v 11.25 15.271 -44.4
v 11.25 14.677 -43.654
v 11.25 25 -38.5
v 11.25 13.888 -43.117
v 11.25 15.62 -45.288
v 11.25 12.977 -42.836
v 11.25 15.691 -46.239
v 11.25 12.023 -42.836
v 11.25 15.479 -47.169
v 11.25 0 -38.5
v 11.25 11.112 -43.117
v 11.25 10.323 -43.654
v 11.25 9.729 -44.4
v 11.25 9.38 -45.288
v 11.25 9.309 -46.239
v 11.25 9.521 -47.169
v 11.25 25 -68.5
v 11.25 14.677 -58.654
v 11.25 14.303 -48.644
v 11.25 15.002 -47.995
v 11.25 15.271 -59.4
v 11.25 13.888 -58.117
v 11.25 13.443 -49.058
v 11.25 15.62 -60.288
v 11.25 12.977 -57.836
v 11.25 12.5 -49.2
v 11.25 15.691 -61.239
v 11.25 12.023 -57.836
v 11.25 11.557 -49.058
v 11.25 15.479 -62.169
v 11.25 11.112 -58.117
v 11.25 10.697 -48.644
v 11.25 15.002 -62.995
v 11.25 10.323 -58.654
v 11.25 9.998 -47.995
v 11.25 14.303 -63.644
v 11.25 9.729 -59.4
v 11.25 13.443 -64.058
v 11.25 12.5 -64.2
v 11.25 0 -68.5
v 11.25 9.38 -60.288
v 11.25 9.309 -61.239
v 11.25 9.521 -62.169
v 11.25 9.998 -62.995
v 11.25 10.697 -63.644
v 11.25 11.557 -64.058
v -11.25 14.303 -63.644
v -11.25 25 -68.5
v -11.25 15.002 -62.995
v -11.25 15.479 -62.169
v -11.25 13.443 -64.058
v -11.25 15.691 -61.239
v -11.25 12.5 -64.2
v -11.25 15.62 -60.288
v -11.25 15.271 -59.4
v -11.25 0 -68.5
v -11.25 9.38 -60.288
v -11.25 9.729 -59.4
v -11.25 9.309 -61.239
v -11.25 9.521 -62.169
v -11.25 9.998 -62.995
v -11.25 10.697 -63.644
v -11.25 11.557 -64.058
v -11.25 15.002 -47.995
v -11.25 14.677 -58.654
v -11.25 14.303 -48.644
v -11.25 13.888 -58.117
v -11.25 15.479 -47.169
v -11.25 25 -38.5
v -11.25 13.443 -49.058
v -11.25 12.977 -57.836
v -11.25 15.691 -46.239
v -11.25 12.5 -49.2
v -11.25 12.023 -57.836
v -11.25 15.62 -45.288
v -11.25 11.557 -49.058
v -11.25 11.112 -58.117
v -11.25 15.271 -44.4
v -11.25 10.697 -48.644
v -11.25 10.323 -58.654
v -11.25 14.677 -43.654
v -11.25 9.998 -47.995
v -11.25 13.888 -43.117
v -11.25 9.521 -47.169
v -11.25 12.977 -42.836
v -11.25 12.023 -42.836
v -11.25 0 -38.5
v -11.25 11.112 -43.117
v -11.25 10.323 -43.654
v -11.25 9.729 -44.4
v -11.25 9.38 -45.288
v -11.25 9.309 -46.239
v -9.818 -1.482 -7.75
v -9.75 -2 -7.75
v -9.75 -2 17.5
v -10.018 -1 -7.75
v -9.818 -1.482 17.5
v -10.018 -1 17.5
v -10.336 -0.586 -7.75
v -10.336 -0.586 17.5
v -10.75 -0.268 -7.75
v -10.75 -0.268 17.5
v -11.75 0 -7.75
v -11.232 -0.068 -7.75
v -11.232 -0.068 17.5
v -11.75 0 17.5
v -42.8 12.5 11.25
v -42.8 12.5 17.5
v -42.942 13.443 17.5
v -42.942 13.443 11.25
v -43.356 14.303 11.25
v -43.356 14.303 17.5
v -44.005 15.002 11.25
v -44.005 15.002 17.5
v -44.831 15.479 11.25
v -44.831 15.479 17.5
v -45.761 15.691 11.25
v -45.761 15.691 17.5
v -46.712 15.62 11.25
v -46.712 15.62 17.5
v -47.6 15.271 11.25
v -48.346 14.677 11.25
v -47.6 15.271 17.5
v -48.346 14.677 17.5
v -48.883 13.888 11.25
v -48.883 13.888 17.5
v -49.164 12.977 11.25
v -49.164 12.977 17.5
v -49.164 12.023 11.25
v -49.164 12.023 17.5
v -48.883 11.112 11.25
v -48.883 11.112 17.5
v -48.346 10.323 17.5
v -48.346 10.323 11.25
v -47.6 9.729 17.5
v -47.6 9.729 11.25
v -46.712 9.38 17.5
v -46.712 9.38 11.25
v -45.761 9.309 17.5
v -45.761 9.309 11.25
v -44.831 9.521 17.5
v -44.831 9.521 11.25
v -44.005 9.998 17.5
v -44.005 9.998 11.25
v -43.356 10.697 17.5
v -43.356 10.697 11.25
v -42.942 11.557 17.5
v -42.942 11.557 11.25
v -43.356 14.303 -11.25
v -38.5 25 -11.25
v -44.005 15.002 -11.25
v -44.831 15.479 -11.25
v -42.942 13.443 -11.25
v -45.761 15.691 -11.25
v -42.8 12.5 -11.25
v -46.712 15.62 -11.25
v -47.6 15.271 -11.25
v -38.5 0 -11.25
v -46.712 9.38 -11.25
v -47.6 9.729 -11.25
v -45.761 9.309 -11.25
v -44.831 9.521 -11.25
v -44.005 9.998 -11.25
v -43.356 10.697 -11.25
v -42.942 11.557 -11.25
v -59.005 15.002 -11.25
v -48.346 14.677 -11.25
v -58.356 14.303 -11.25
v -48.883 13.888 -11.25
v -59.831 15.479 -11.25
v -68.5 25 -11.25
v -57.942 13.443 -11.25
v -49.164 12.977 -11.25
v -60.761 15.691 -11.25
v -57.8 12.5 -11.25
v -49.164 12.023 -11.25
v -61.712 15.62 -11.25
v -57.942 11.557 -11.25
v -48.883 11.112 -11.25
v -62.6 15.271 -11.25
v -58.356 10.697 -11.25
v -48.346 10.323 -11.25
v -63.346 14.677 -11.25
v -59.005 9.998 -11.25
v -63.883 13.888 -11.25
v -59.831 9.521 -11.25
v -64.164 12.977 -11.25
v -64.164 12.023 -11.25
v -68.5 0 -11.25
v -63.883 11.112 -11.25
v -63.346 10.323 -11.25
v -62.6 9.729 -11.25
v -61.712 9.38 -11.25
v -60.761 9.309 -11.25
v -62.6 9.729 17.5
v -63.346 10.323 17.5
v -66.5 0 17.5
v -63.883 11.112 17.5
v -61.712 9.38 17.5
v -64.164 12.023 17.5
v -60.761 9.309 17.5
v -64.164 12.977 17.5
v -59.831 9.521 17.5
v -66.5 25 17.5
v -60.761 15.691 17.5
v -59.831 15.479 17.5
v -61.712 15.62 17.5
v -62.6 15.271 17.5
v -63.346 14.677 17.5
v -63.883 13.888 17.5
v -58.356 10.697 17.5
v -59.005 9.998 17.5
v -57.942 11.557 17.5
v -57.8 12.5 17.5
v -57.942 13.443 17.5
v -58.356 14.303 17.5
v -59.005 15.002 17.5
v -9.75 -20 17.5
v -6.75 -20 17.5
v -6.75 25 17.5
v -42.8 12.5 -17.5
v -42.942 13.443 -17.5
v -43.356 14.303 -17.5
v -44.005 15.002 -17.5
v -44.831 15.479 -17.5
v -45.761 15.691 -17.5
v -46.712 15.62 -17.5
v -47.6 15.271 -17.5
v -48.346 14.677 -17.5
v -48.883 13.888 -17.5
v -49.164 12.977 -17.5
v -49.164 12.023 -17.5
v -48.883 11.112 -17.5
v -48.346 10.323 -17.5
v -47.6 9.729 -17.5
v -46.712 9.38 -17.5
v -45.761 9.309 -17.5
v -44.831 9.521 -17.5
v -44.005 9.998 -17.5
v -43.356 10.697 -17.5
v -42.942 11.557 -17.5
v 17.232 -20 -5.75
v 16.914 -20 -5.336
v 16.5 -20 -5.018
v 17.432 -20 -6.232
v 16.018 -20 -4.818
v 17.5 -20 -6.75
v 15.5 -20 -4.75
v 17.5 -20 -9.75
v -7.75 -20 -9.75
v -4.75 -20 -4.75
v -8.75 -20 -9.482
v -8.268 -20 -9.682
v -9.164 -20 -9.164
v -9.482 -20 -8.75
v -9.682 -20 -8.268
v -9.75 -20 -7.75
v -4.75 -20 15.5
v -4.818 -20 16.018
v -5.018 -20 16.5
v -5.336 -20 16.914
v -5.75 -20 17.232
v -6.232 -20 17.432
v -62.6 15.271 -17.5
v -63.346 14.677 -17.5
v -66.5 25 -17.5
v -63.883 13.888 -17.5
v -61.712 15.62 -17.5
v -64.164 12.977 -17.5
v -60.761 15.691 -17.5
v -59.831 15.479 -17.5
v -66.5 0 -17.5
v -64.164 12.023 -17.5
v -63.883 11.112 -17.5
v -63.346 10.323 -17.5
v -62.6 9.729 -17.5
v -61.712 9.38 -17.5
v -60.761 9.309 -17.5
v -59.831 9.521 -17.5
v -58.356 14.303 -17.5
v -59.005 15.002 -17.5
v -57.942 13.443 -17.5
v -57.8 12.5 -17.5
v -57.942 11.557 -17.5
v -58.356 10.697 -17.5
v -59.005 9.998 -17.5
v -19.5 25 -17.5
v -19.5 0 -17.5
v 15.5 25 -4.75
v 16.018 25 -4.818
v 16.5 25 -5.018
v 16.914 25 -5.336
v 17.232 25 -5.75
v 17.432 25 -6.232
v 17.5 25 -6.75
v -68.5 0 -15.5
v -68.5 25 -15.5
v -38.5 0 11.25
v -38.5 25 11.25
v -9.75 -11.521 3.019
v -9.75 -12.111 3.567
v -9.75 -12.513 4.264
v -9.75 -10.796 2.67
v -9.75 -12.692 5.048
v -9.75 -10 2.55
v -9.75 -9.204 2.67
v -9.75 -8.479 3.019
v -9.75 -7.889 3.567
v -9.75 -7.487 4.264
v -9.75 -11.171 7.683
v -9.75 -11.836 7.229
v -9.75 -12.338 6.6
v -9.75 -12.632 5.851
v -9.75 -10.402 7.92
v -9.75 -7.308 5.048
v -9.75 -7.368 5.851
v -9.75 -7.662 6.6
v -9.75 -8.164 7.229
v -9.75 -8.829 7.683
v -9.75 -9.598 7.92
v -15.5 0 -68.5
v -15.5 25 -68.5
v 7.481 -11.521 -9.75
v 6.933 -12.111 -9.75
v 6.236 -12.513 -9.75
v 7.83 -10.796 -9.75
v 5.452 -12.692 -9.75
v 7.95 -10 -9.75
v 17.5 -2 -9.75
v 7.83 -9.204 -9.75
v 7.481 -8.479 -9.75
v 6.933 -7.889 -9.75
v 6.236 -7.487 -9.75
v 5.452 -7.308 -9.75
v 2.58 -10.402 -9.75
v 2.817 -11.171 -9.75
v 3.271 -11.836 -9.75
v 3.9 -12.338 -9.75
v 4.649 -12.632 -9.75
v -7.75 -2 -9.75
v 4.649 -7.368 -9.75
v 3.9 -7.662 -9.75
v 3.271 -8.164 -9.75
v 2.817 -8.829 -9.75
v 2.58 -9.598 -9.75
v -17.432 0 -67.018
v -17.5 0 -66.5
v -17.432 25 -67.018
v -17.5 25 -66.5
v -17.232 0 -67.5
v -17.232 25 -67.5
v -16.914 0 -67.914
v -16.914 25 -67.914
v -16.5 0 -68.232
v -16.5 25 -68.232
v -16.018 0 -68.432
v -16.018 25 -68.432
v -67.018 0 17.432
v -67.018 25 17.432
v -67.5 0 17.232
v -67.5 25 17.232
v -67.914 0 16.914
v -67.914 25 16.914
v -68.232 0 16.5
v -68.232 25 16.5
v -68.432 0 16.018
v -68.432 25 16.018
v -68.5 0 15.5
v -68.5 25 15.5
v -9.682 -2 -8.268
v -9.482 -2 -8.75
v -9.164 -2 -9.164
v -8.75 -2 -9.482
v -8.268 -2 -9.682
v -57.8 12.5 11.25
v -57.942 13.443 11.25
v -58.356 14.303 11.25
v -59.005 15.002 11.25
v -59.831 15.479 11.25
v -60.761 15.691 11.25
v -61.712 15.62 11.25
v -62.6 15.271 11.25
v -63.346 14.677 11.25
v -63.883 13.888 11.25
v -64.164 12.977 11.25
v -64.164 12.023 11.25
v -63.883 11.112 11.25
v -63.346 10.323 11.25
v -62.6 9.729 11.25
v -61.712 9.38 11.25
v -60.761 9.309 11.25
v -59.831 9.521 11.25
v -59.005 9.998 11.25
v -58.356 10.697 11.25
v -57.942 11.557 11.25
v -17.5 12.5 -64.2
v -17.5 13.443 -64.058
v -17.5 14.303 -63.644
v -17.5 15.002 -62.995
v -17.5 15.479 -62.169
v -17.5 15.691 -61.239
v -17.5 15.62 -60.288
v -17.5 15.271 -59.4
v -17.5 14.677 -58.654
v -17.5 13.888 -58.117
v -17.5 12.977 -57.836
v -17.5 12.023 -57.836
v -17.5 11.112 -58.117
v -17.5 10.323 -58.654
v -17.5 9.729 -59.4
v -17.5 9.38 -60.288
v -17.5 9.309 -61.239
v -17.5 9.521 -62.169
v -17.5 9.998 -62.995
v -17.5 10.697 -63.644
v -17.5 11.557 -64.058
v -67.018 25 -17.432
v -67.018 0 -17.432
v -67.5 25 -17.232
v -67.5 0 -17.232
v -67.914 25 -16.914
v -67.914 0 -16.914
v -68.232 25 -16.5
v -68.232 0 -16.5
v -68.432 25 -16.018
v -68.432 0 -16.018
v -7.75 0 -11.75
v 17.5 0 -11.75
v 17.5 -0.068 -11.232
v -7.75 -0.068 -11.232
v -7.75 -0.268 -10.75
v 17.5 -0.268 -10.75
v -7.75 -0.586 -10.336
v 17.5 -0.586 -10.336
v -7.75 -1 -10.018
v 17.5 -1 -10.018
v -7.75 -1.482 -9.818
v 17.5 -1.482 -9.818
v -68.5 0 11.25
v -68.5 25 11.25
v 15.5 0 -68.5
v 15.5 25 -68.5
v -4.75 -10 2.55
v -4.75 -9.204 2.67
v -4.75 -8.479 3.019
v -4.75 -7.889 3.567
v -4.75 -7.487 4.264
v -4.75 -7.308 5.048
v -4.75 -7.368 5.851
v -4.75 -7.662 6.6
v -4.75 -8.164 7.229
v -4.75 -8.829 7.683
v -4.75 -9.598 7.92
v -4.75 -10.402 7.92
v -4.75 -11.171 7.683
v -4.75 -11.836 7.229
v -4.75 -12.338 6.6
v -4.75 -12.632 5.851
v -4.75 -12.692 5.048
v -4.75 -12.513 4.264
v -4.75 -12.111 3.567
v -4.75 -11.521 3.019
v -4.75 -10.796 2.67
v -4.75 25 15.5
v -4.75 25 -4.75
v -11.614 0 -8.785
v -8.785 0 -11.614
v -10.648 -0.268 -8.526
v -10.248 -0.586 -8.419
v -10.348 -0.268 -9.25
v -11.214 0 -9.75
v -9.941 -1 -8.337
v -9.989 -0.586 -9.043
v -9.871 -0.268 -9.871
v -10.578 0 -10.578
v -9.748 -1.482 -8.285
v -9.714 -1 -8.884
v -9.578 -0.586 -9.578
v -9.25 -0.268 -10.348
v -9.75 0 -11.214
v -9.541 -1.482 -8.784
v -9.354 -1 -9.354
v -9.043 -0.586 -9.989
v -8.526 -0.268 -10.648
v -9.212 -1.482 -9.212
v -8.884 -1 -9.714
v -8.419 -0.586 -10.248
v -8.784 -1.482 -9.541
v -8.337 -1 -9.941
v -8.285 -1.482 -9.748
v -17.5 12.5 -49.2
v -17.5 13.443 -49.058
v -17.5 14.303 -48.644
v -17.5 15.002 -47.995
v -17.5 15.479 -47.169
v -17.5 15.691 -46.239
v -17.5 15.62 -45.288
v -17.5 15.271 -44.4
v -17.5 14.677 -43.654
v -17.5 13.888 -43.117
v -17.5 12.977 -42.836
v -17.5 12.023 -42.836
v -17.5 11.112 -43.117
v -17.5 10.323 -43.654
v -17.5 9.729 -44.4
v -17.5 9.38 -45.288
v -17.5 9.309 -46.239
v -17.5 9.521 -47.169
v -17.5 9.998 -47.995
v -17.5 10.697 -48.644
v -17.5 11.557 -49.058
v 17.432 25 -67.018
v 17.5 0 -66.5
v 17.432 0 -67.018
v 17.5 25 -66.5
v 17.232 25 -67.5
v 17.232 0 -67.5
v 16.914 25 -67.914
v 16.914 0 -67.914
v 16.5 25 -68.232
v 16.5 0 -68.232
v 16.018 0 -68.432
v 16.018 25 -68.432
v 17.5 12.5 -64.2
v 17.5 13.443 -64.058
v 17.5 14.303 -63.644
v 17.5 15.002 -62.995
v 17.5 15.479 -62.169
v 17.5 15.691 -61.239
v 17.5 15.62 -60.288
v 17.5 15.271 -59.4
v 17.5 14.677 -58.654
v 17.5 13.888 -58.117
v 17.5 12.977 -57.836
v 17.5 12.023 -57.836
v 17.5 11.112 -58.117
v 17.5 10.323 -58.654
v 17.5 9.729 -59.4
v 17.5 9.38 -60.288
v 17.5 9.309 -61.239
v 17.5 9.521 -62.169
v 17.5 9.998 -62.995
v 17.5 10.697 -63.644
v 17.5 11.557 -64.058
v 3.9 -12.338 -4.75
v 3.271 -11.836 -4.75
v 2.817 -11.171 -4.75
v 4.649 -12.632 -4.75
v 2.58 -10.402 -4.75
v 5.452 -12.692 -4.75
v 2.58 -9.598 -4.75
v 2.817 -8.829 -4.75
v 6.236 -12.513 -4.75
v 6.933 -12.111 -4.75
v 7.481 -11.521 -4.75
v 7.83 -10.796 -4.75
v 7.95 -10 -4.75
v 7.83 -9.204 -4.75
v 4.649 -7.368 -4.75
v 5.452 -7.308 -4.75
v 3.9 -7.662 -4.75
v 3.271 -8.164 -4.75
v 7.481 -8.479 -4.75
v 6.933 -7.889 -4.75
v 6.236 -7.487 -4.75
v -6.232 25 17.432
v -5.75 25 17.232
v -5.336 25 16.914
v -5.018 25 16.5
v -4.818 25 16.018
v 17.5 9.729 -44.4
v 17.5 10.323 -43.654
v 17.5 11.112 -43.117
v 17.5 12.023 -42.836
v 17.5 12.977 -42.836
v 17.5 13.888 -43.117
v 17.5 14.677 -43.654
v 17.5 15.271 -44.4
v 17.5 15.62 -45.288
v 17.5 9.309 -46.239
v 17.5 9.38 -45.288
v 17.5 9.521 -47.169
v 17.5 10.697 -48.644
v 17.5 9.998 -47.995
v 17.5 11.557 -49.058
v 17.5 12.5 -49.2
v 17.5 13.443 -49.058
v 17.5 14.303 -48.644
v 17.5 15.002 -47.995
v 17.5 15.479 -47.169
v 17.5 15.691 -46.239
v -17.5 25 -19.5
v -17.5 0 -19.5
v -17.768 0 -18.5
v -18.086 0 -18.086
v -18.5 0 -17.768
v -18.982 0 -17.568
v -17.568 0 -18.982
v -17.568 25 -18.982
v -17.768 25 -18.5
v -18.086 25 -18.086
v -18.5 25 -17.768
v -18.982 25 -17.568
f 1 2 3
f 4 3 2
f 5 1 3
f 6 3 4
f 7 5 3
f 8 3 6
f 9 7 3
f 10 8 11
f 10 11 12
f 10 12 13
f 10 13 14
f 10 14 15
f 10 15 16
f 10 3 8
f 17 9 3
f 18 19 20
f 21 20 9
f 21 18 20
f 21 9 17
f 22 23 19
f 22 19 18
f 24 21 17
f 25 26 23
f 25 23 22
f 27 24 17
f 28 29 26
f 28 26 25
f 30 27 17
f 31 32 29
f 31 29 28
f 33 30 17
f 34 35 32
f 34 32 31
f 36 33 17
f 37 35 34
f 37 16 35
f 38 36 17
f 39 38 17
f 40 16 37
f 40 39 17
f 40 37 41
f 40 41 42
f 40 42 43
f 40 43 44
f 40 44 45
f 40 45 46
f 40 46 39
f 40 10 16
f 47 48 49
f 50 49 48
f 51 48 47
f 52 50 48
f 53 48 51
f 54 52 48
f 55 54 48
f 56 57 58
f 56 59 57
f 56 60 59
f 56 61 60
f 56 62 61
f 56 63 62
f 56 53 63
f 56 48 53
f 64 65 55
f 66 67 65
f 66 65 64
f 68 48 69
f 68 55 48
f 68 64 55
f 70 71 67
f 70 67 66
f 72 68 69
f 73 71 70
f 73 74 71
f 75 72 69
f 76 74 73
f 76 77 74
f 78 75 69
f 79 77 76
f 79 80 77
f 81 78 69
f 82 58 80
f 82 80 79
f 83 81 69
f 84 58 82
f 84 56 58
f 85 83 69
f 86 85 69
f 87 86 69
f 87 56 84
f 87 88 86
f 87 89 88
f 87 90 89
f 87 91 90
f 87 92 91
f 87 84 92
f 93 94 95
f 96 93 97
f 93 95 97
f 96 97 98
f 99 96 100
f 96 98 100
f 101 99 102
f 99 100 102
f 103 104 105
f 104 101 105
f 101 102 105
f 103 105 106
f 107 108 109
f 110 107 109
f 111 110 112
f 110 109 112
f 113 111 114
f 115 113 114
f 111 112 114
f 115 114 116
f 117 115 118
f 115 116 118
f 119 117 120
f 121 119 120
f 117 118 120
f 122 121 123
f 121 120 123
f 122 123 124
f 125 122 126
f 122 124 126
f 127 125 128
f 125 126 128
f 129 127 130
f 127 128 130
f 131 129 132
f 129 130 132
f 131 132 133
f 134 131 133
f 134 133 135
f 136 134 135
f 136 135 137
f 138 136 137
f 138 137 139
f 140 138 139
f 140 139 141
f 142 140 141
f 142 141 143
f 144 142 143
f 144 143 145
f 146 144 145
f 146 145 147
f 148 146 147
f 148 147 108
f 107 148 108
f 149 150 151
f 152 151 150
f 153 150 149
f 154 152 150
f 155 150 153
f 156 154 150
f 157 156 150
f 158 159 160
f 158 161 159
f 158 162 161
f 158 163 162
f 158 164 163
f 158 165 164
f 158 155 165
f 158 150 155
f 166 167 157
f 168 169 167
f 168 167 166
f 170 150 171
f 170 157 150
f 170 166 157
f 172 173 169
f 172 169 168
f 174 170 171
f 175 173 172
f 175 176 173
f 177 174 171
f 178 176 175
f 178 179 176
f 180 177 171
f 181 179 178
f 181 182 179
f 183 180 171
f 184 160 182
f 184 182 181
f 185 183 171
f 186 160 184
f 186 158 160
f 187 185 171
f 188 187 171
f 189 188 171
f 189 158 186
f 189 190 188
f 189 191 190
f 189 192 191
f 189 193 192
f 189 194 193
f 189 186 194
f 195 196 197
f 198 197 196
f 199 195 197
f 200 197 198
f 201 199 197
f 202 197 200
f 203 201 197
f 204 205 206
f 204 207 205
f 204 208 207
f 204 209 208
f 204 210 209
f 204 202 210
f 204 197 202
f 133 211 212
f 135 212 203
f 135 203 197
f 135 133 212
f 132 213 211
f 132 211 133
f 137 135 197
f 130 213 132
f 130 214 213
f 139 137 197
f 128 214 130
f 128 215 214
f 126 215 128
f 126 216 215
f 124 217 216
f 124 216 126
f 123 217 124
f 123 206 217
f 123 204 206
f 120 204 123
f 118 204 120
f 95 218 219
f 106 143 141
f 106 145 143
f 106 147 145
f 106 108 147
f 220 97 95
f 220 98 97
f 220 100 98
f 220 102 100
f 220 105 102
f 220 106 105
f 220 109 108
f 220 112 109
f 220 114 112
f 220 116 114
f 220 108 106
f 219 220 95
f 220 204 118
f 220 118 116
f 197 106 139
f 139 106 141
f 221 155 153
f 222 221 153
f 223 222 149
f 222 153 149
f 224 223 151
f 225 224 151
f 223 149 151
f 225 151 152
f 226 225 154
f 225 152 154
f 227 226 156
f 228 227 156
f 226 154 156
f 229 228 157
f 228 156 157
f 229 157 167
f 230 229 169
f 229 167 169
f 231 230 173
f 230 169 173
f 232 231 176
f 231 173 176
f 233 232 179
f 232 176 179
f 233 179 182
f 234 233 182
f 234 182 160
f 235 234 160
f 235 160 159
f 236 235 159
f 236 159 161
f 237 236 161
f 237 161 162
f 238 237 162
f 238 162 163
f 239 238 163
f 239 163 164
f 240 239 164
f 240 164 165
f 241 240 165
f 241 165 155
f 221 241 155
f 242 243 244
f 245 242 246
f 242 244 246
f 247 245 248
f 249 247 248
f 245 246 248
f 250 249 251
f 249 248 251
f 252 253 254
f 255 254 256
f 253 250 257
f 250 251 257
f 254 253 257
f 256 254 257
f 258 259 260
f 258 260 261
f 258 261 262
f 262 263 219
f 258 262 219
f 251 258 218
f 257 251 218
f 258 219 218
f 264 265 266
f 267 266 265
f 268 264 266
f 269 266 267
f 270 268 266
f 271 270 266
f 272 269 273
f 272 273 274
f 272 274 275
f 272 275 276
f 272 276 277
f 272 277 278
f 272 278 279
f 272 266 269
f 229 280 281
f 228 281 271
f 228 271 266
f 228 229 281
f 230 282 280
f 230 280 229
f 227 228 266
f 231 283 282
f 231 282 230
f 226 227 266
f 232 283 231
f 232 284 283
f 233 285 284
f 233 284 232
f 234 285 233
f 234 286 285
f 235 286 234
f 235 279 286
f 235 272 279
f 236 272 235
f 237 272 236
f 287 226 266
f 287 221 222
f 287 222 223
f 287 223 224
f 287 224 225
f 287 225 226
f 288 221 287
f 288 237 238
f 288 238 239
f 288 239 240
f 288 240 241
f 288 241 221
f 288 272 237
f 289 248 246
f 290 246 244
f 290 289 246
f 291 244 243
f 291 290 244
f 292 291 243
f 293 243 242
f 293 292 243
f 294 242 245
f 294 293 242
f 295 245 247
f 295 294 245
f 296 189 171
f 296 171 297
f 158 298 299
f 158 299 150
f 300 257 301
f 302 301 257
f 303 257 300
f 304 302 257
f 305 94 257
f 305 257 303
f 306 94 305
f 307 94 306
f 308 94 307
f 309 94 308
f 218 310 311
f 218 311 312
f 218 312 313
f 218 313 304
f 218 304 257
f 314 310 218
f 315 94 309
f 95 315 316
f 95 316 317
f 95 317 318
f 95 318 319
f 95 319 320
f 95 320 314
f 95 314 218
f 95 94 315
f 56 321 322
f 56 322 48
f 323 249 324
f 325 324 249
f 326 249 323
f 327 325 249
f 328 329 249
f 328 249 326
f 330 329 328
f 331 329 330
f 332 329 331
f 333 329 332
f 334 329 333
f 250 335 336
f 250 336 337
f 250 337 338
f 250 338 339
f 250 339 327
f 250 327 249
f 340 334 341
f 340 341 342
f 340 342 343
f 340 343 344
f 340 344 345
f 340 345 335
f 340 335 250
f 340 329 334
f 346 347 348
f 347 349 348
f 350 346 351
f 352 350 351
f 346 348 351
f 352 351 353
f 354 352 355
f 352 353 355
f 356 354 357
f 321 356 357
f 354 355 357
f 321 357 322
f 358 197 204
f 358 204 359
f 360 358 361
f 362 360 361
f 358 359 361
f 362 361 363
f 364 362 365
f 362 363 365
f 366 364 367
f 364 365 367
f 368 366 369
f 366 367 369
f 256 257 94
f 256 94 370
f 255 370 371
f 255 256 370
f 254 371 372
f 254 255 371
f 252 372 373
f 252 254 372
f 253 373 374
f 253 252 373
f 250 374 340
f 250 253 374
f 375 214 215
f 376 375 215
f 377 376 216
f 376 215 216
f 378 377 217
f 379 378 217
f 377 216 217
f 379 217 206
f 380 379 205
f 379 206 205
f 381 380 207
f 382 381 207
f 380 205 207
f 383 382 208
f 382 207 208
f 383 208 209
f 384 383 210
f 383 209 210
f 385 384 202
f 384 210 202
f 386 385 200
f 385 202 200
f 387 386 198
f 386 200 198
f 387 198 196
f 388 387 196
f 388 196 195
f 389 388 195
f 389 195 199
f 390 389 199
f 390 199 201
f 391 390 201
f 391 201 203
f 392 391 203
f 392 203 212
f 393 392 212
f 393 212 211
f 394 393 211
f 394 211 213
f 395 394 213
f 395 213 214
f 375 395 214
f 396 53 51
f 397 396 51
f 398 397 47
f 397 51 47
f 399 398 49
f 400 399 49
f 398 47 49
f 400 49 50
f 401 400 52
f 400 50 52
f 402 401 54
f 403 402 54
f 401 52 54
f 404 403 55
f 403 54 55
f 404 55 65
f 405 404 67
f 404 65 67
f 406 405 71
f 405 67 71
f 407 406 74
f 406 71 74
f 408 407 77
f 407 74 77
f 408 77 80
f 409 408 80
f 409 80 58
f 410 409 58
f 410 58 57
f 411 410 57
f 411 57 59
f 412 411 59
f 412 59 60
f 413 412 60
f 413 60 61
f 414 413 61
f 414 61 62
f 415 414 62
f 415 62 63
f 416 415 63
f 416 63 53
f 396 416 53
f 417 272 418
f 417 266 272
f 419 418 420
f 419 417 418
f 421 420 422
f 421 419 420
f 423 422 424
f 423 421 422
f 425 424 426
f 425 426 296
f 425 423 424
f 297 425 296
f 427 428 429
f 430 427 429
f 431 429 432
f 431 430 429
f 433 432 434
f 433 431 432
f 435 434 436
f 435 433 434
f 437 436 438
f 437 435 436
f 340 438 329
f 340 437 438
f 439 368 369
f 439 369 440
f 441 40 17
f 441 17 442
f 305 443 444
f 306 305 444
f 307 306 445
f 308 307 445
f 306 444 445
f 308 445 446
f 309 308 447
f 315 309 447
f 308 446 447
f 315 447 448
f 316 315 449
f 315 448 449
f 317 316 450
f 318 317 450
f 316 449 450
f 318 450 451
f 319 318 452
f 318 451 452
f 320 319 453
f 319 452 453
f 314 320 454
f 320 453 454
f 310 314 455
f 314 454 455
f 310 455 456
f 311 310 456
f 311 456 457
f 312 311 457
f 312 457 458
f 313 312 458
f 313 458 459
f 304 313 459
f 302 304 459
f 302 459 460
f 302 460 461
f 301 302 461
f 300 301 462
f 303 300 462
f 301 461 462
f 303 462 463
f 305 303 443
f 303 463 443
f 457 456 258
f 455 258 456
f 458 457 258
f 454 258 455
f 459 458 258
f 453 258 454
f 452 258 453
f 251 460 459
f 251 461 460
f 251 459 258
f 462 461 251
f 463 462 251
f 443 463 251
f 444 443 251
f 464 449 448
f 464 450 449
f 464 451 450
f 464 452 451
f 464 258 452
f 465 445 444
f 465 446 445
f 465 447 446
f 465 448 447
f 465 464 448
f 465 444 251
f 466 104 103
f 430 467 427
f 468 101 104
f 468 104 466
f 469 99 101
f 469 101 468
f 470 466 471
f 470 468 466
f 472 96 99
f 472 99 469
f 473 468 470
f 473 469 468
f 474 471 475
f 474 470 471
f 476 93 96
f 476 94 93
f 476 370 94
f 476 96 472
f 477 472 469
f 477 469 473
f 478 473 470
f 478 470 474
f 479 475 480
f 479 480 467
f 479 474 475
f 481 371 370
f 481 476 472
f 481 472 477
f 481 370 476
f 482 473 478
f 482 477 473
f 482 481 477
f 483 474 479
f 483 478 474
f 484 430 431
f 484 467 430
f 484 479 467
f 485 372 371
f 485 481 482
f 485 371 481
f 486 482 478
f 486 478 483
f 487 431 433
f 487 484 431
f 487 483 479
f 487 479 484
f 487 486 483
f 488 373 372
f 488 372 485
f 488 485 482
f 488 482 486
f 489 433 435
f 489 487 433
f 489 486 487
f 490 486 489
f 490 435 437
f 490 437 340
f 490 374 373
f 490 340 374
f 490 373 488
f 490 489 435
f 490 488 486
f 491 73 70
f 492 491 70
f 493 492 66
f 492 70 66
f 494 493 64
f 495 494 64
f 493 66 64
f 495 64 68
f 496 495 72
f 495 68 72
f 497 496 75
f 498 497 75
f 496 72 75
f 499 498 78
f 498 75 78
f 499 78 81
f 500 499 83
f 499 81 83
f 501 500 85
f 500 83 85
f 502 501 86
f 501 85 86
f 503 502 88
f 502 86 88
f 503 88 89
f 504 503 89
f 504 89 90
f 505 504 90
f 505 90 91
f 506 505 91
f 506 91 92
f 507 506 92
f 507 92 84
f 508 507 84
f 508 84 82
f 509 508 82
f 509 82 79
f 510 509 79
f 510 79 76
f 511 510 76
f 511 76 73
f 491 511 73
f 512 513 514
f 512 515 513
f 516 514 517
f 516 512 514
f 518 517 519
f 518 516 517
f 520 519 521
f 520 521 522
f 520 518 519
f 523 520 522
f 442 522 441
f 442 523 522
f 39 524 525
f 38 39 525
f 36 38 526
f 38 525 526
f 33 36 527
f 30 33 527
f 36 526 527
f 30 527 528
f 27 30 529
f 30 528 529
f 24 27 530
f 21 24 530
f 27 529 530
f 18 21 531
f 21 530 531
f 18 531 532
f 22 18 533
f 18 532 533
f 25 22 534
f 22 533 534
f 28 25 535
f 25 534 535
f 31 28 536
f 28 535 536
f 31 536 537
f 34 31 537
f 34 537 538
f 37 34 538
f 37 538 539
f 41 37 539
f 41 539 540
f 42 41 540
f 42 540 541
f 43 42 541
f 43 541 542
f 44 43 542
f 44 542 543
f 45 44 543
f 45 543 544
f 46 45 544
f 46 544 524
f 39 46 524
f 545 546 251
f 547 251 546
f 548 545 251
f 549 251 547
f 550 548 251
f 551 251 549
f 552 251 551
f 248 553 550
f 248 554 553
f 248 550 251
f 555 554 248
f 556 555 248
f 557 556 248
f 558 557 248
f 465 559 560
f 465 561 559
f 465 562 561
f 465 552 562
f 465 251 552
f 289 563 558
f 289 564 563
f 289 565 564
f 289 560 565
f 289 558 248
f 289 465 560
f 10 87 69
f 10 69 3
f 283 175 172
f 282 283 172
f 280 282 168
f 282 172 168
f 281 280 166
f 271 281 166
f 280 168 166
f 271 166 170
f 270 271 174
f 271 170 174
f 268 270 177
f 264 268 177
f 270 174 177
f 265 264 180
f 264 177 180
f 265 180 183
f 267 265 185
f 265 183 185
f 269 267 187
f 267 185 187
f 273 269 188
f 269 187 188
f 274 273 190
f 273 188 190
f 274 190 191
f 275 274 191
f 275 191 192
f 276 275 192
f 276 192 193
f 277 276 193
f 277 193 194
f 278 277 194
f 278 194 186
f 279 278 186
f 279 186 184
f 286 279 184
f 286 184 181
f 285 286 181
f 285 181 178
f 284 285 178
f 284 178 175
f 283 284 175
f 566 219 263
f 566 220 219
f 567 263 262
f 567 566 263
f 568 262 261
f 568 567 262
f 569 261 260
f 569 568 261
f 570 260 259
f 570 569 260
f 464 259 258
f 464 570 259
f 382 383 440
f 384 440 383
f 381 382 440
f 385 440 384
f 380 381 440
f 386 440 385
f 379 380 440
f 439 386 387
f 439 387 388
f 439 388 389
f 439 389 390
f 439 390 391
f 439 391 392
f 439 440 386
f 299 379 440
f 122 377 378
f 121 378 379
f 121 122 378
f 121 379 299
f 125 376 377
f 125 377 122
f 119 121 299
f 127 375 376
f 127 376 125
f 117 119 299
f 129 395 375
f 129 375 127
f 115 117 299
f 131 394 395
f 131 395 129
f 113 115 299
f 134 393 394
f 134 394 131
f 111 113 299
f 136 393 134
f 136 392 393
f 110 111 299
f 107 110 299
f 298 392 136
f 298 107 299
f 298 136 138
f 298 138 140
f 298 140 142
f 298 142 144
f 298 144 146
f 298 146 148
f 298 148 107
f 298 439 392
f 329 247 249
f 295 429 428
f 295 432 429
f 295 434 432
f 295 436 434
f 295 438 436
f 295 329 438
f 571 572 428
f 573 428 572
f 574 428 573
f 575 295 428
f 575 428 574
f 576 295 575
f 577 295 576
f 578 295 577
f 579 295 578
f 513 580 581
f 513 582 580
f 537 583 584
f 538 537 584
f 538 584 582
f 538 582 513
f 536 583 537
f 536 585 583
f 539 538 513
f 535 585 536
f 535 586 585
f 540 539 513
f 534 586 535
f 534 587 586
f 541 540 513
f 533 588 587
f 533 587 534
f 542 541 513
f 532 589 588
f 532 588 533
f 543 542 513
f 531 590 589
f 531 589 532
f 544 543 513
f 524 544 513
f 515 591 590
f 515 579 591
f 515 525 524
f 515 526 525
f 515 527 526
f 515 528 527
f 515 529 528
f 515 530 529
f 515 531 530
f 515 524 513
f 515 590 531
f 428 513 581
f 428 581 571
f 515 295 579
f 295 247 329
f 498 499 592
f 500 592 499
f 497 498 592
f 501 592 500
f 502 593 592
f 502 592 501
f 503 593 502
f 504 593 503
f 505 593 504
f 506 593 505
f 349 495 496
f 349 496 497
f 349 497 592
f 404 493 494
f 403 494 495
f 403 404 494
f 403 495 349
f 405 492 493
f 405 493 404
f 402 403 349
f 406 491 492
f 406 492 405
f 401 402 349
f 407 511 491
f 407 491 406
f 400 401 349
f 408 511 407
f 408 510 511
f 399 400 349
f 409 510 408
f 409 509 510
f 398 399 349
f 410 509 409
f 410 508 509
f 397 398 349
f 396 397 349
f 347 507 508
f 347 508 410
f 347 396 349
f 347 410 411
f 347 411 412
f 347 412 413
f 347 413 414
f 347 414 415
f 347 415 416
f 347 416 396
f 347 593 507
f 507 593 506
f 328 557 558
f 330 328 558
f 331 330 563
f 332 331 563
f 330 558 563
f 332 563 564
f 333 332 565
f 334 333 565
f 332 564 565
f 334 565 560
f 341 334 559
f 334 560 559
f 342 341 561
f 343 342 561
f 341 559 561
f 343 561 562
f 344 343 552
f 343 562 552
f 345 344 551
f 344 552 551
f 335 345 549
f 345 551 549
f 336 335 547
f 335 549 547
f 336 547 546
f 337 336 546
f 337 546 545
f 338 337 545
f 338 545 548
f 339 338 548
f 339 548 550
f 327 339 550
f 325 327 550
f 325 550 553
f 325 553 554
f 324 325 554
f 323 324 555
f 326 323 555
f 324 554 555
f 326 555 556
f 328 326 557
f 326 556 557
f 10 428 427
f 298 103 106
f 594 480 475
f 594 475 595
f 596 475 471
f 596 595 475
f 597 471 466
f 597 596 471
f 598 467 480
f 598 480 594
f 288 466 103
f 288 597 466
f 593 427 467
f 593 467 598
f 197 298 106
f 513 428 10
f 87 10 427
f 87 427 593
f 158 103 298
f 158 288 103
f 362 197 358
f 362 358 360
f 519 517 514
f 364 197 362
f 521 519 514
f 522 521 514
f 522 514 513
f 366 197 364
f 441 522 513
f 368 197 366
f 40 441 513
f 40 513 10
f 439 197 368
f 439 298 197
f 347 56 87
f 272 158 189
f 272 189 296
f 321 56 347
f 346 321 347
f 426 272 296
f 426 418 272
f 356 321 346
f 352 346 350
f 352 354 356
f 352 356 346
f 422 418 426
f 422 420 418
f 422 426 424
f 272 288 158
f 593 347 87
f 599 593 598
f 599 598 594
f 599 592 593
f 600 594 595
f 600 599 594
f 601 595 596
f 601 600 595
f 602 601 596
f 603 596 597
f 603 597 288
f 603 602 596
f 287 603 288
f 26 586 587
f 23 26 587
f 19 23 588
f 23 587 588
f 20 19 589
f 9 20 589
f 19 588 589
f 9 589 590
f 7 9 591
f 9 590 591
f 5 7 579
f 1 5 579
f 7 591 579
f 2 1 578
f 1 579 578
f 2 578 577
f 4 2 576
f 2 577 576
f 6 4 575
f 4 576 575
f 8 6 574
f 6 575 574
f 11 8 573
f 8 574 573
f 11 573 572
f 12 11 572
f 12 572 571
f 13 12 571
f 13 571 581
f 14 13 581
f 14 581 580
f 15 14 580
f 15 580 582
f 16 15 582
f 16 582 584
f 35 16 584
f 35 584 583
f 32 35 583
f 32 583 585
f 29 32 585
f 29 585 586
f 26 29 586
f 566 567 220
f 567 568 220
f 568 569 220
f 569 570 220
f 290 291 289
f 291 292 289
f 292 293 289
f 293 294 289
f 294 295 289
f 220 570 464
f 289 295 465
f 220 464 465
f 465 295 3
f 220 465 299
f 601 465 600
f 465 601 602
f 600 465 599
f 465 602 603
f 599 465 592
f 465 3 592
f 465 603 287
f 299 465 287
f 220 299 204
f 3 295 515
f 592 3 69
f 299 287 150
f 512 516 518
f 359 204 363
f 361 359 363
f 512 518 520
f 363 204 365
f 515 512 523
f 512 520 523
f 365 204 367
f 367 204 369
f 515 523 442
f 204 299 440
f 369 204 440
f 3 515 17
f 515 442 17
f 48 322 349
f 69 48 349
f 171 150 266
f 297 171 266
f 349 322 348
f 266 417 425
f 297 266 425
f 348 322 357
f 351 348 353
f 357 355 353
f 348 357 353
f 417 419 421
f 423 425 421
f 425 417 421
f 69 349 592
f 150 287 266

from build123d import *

# Parameters (mm, degrees)
EXTRUDE_1_DEPTH     = 25
SKETCH_2_R          = 3.2
CUT_EXTRUDE_1_DEPTH = 35
SKETCH_3_R          = 3.2
CUT_EXTRUDE_2_DEPTH = 35
SKETCH_5_W          = 22.25
SKETCH_5_H          = 22.25
CUT_EXTRUDE_4_DEPTH = 25
EXTRUDE_2_DEPTH     = 20
SKETCH_7_R          = 2.7
CUT_EXTRUDE_5_DEPTH = 5
SKETCH_8_R          = 2.7
CUT_EXTRUDE_6_DEPTH = 5
FILLET_1_R          = 2


with BuildPart() as part:
    # 스케치1 → 보스-돌출1 (new body)
    with BuildSketch(Plane(origin=(0, 0, 0), x_dir=(1, 0, 0), z_dir=(0, 1, 0))):
        Polygon((-17.5, 68.5), (-11.25, 68.5), (-11.25, 38.5), (11.25, 38.5), (11.25, 68.5), (17.5, 68.5), (17.5, -17.5), (-68.5, -17.5), (-68.5, -11.25), (-38.5, -11.25), (-38.5, 11.25), (-68.5, 11.25), (-68.5, 17.5), (-17.5, 17.5), align=None)
    extrude(amount=EXTRUDE_1_DEPTH)

    # 스케치2 → 컷-돌출1 (cut)
    with BuildSketch(Plane(origin=(17.5, 0, 0), x_dir=(0, 0, -1), z_dir=(1, 0, 0))):
        with Locations((61, 12.5)):
            Circle(SKETCH_2_R)
        with Locations((46, 12.5)):
            Circle(SKETCH_2_R)
    extrude(amount=-CUT_EXTRUDE_1_DEPTH, mode=Mode.SUBTRACT)

    # 스케치3 → 컷-돌출2 (cut)
    with BuildSketch(Plane.XY.offset(17.5)):
        with Locations((-61, 12.5)):
            Circle(SKETCH_3_R)
        with Locations((-46, 12.5)):
            Circle(SKETCH_3_R)
    extrude(amount=-CUT_EXTRUDE_2_DEPTH, mode=Mode.SUBTRACT)

    # 스케치5 → 컷-돌출4 (cut)
    with BuildSketch(Plane(origin=(0, 25, 0), x_dir=(1, 0, 0), z_dir=(0, 1, 0))):
        with Locations((6.375, -6.375)):
            Rectangle(SKETCH_5_W, SKETCH_5_H)
    extrude(amount=-CUT_EXTRUDE_4_DEPTH, mode=Mode.SUBTRACT)

    # 스케치6 → 보스-돌출2 (add)
    with BuildSketch(Plane.XZ):
        Polygon((-9.75, 17.5), (-4.75, 17.5), (-4.75, -4.75), (17.5, -4.75), (17.5, -9.75), (-9.75, -9.75), align=None)
    extrude(amount=EXTRUDE_2_DEPTH)

    # 스케치7 → 컷-돌출5 (cut)
    with BuildSketch(Plane(origin=(-4.75, 0, 0), x_dir=(0, 0, -1), z_dir=(1, 0, 0))):
        with Locations((-5.25, -10)):
            Circle(SKETCH_7_R)
    extrude(amount=-CUT_EXTRUDE_5_DEPTH, mode=Mode.SUBTRACT)

    # 스케치8 → 컷-돌출6 (cut)
    with BuildSketch(Plane.XY.offset(-4.75)):
        with Locations((5.25, -10)):
            Circle(SKETCH_8_R)
    extrude(amount=-CUT_EXTRUDE_6_DEPTH, mode=Mode.SUBTRACT)

    # 필렛1
    fillet_1_edges = [part.edges().sort_by_distance(p)[0] for p in [
        (-17.5, 12.5, -68.5),
        (17.5, 12.5, -68.5),
        (-68.5, 12.5, 17.5),
        (-68.5, 12.5, -17.5),
        (-17.5, 12.5, -17.5),
        (-4.75, 2.5, 17.5),
        (17.5, 2.5, -4.75),
        (-9.75, 0, 3.875),
        (3.875, 0, -9.75),
        (-9.75, -10, -9.75),
    ]]
    fillet(fillet_1_edges, radius=FILLET_1_R)


solid = part.part
